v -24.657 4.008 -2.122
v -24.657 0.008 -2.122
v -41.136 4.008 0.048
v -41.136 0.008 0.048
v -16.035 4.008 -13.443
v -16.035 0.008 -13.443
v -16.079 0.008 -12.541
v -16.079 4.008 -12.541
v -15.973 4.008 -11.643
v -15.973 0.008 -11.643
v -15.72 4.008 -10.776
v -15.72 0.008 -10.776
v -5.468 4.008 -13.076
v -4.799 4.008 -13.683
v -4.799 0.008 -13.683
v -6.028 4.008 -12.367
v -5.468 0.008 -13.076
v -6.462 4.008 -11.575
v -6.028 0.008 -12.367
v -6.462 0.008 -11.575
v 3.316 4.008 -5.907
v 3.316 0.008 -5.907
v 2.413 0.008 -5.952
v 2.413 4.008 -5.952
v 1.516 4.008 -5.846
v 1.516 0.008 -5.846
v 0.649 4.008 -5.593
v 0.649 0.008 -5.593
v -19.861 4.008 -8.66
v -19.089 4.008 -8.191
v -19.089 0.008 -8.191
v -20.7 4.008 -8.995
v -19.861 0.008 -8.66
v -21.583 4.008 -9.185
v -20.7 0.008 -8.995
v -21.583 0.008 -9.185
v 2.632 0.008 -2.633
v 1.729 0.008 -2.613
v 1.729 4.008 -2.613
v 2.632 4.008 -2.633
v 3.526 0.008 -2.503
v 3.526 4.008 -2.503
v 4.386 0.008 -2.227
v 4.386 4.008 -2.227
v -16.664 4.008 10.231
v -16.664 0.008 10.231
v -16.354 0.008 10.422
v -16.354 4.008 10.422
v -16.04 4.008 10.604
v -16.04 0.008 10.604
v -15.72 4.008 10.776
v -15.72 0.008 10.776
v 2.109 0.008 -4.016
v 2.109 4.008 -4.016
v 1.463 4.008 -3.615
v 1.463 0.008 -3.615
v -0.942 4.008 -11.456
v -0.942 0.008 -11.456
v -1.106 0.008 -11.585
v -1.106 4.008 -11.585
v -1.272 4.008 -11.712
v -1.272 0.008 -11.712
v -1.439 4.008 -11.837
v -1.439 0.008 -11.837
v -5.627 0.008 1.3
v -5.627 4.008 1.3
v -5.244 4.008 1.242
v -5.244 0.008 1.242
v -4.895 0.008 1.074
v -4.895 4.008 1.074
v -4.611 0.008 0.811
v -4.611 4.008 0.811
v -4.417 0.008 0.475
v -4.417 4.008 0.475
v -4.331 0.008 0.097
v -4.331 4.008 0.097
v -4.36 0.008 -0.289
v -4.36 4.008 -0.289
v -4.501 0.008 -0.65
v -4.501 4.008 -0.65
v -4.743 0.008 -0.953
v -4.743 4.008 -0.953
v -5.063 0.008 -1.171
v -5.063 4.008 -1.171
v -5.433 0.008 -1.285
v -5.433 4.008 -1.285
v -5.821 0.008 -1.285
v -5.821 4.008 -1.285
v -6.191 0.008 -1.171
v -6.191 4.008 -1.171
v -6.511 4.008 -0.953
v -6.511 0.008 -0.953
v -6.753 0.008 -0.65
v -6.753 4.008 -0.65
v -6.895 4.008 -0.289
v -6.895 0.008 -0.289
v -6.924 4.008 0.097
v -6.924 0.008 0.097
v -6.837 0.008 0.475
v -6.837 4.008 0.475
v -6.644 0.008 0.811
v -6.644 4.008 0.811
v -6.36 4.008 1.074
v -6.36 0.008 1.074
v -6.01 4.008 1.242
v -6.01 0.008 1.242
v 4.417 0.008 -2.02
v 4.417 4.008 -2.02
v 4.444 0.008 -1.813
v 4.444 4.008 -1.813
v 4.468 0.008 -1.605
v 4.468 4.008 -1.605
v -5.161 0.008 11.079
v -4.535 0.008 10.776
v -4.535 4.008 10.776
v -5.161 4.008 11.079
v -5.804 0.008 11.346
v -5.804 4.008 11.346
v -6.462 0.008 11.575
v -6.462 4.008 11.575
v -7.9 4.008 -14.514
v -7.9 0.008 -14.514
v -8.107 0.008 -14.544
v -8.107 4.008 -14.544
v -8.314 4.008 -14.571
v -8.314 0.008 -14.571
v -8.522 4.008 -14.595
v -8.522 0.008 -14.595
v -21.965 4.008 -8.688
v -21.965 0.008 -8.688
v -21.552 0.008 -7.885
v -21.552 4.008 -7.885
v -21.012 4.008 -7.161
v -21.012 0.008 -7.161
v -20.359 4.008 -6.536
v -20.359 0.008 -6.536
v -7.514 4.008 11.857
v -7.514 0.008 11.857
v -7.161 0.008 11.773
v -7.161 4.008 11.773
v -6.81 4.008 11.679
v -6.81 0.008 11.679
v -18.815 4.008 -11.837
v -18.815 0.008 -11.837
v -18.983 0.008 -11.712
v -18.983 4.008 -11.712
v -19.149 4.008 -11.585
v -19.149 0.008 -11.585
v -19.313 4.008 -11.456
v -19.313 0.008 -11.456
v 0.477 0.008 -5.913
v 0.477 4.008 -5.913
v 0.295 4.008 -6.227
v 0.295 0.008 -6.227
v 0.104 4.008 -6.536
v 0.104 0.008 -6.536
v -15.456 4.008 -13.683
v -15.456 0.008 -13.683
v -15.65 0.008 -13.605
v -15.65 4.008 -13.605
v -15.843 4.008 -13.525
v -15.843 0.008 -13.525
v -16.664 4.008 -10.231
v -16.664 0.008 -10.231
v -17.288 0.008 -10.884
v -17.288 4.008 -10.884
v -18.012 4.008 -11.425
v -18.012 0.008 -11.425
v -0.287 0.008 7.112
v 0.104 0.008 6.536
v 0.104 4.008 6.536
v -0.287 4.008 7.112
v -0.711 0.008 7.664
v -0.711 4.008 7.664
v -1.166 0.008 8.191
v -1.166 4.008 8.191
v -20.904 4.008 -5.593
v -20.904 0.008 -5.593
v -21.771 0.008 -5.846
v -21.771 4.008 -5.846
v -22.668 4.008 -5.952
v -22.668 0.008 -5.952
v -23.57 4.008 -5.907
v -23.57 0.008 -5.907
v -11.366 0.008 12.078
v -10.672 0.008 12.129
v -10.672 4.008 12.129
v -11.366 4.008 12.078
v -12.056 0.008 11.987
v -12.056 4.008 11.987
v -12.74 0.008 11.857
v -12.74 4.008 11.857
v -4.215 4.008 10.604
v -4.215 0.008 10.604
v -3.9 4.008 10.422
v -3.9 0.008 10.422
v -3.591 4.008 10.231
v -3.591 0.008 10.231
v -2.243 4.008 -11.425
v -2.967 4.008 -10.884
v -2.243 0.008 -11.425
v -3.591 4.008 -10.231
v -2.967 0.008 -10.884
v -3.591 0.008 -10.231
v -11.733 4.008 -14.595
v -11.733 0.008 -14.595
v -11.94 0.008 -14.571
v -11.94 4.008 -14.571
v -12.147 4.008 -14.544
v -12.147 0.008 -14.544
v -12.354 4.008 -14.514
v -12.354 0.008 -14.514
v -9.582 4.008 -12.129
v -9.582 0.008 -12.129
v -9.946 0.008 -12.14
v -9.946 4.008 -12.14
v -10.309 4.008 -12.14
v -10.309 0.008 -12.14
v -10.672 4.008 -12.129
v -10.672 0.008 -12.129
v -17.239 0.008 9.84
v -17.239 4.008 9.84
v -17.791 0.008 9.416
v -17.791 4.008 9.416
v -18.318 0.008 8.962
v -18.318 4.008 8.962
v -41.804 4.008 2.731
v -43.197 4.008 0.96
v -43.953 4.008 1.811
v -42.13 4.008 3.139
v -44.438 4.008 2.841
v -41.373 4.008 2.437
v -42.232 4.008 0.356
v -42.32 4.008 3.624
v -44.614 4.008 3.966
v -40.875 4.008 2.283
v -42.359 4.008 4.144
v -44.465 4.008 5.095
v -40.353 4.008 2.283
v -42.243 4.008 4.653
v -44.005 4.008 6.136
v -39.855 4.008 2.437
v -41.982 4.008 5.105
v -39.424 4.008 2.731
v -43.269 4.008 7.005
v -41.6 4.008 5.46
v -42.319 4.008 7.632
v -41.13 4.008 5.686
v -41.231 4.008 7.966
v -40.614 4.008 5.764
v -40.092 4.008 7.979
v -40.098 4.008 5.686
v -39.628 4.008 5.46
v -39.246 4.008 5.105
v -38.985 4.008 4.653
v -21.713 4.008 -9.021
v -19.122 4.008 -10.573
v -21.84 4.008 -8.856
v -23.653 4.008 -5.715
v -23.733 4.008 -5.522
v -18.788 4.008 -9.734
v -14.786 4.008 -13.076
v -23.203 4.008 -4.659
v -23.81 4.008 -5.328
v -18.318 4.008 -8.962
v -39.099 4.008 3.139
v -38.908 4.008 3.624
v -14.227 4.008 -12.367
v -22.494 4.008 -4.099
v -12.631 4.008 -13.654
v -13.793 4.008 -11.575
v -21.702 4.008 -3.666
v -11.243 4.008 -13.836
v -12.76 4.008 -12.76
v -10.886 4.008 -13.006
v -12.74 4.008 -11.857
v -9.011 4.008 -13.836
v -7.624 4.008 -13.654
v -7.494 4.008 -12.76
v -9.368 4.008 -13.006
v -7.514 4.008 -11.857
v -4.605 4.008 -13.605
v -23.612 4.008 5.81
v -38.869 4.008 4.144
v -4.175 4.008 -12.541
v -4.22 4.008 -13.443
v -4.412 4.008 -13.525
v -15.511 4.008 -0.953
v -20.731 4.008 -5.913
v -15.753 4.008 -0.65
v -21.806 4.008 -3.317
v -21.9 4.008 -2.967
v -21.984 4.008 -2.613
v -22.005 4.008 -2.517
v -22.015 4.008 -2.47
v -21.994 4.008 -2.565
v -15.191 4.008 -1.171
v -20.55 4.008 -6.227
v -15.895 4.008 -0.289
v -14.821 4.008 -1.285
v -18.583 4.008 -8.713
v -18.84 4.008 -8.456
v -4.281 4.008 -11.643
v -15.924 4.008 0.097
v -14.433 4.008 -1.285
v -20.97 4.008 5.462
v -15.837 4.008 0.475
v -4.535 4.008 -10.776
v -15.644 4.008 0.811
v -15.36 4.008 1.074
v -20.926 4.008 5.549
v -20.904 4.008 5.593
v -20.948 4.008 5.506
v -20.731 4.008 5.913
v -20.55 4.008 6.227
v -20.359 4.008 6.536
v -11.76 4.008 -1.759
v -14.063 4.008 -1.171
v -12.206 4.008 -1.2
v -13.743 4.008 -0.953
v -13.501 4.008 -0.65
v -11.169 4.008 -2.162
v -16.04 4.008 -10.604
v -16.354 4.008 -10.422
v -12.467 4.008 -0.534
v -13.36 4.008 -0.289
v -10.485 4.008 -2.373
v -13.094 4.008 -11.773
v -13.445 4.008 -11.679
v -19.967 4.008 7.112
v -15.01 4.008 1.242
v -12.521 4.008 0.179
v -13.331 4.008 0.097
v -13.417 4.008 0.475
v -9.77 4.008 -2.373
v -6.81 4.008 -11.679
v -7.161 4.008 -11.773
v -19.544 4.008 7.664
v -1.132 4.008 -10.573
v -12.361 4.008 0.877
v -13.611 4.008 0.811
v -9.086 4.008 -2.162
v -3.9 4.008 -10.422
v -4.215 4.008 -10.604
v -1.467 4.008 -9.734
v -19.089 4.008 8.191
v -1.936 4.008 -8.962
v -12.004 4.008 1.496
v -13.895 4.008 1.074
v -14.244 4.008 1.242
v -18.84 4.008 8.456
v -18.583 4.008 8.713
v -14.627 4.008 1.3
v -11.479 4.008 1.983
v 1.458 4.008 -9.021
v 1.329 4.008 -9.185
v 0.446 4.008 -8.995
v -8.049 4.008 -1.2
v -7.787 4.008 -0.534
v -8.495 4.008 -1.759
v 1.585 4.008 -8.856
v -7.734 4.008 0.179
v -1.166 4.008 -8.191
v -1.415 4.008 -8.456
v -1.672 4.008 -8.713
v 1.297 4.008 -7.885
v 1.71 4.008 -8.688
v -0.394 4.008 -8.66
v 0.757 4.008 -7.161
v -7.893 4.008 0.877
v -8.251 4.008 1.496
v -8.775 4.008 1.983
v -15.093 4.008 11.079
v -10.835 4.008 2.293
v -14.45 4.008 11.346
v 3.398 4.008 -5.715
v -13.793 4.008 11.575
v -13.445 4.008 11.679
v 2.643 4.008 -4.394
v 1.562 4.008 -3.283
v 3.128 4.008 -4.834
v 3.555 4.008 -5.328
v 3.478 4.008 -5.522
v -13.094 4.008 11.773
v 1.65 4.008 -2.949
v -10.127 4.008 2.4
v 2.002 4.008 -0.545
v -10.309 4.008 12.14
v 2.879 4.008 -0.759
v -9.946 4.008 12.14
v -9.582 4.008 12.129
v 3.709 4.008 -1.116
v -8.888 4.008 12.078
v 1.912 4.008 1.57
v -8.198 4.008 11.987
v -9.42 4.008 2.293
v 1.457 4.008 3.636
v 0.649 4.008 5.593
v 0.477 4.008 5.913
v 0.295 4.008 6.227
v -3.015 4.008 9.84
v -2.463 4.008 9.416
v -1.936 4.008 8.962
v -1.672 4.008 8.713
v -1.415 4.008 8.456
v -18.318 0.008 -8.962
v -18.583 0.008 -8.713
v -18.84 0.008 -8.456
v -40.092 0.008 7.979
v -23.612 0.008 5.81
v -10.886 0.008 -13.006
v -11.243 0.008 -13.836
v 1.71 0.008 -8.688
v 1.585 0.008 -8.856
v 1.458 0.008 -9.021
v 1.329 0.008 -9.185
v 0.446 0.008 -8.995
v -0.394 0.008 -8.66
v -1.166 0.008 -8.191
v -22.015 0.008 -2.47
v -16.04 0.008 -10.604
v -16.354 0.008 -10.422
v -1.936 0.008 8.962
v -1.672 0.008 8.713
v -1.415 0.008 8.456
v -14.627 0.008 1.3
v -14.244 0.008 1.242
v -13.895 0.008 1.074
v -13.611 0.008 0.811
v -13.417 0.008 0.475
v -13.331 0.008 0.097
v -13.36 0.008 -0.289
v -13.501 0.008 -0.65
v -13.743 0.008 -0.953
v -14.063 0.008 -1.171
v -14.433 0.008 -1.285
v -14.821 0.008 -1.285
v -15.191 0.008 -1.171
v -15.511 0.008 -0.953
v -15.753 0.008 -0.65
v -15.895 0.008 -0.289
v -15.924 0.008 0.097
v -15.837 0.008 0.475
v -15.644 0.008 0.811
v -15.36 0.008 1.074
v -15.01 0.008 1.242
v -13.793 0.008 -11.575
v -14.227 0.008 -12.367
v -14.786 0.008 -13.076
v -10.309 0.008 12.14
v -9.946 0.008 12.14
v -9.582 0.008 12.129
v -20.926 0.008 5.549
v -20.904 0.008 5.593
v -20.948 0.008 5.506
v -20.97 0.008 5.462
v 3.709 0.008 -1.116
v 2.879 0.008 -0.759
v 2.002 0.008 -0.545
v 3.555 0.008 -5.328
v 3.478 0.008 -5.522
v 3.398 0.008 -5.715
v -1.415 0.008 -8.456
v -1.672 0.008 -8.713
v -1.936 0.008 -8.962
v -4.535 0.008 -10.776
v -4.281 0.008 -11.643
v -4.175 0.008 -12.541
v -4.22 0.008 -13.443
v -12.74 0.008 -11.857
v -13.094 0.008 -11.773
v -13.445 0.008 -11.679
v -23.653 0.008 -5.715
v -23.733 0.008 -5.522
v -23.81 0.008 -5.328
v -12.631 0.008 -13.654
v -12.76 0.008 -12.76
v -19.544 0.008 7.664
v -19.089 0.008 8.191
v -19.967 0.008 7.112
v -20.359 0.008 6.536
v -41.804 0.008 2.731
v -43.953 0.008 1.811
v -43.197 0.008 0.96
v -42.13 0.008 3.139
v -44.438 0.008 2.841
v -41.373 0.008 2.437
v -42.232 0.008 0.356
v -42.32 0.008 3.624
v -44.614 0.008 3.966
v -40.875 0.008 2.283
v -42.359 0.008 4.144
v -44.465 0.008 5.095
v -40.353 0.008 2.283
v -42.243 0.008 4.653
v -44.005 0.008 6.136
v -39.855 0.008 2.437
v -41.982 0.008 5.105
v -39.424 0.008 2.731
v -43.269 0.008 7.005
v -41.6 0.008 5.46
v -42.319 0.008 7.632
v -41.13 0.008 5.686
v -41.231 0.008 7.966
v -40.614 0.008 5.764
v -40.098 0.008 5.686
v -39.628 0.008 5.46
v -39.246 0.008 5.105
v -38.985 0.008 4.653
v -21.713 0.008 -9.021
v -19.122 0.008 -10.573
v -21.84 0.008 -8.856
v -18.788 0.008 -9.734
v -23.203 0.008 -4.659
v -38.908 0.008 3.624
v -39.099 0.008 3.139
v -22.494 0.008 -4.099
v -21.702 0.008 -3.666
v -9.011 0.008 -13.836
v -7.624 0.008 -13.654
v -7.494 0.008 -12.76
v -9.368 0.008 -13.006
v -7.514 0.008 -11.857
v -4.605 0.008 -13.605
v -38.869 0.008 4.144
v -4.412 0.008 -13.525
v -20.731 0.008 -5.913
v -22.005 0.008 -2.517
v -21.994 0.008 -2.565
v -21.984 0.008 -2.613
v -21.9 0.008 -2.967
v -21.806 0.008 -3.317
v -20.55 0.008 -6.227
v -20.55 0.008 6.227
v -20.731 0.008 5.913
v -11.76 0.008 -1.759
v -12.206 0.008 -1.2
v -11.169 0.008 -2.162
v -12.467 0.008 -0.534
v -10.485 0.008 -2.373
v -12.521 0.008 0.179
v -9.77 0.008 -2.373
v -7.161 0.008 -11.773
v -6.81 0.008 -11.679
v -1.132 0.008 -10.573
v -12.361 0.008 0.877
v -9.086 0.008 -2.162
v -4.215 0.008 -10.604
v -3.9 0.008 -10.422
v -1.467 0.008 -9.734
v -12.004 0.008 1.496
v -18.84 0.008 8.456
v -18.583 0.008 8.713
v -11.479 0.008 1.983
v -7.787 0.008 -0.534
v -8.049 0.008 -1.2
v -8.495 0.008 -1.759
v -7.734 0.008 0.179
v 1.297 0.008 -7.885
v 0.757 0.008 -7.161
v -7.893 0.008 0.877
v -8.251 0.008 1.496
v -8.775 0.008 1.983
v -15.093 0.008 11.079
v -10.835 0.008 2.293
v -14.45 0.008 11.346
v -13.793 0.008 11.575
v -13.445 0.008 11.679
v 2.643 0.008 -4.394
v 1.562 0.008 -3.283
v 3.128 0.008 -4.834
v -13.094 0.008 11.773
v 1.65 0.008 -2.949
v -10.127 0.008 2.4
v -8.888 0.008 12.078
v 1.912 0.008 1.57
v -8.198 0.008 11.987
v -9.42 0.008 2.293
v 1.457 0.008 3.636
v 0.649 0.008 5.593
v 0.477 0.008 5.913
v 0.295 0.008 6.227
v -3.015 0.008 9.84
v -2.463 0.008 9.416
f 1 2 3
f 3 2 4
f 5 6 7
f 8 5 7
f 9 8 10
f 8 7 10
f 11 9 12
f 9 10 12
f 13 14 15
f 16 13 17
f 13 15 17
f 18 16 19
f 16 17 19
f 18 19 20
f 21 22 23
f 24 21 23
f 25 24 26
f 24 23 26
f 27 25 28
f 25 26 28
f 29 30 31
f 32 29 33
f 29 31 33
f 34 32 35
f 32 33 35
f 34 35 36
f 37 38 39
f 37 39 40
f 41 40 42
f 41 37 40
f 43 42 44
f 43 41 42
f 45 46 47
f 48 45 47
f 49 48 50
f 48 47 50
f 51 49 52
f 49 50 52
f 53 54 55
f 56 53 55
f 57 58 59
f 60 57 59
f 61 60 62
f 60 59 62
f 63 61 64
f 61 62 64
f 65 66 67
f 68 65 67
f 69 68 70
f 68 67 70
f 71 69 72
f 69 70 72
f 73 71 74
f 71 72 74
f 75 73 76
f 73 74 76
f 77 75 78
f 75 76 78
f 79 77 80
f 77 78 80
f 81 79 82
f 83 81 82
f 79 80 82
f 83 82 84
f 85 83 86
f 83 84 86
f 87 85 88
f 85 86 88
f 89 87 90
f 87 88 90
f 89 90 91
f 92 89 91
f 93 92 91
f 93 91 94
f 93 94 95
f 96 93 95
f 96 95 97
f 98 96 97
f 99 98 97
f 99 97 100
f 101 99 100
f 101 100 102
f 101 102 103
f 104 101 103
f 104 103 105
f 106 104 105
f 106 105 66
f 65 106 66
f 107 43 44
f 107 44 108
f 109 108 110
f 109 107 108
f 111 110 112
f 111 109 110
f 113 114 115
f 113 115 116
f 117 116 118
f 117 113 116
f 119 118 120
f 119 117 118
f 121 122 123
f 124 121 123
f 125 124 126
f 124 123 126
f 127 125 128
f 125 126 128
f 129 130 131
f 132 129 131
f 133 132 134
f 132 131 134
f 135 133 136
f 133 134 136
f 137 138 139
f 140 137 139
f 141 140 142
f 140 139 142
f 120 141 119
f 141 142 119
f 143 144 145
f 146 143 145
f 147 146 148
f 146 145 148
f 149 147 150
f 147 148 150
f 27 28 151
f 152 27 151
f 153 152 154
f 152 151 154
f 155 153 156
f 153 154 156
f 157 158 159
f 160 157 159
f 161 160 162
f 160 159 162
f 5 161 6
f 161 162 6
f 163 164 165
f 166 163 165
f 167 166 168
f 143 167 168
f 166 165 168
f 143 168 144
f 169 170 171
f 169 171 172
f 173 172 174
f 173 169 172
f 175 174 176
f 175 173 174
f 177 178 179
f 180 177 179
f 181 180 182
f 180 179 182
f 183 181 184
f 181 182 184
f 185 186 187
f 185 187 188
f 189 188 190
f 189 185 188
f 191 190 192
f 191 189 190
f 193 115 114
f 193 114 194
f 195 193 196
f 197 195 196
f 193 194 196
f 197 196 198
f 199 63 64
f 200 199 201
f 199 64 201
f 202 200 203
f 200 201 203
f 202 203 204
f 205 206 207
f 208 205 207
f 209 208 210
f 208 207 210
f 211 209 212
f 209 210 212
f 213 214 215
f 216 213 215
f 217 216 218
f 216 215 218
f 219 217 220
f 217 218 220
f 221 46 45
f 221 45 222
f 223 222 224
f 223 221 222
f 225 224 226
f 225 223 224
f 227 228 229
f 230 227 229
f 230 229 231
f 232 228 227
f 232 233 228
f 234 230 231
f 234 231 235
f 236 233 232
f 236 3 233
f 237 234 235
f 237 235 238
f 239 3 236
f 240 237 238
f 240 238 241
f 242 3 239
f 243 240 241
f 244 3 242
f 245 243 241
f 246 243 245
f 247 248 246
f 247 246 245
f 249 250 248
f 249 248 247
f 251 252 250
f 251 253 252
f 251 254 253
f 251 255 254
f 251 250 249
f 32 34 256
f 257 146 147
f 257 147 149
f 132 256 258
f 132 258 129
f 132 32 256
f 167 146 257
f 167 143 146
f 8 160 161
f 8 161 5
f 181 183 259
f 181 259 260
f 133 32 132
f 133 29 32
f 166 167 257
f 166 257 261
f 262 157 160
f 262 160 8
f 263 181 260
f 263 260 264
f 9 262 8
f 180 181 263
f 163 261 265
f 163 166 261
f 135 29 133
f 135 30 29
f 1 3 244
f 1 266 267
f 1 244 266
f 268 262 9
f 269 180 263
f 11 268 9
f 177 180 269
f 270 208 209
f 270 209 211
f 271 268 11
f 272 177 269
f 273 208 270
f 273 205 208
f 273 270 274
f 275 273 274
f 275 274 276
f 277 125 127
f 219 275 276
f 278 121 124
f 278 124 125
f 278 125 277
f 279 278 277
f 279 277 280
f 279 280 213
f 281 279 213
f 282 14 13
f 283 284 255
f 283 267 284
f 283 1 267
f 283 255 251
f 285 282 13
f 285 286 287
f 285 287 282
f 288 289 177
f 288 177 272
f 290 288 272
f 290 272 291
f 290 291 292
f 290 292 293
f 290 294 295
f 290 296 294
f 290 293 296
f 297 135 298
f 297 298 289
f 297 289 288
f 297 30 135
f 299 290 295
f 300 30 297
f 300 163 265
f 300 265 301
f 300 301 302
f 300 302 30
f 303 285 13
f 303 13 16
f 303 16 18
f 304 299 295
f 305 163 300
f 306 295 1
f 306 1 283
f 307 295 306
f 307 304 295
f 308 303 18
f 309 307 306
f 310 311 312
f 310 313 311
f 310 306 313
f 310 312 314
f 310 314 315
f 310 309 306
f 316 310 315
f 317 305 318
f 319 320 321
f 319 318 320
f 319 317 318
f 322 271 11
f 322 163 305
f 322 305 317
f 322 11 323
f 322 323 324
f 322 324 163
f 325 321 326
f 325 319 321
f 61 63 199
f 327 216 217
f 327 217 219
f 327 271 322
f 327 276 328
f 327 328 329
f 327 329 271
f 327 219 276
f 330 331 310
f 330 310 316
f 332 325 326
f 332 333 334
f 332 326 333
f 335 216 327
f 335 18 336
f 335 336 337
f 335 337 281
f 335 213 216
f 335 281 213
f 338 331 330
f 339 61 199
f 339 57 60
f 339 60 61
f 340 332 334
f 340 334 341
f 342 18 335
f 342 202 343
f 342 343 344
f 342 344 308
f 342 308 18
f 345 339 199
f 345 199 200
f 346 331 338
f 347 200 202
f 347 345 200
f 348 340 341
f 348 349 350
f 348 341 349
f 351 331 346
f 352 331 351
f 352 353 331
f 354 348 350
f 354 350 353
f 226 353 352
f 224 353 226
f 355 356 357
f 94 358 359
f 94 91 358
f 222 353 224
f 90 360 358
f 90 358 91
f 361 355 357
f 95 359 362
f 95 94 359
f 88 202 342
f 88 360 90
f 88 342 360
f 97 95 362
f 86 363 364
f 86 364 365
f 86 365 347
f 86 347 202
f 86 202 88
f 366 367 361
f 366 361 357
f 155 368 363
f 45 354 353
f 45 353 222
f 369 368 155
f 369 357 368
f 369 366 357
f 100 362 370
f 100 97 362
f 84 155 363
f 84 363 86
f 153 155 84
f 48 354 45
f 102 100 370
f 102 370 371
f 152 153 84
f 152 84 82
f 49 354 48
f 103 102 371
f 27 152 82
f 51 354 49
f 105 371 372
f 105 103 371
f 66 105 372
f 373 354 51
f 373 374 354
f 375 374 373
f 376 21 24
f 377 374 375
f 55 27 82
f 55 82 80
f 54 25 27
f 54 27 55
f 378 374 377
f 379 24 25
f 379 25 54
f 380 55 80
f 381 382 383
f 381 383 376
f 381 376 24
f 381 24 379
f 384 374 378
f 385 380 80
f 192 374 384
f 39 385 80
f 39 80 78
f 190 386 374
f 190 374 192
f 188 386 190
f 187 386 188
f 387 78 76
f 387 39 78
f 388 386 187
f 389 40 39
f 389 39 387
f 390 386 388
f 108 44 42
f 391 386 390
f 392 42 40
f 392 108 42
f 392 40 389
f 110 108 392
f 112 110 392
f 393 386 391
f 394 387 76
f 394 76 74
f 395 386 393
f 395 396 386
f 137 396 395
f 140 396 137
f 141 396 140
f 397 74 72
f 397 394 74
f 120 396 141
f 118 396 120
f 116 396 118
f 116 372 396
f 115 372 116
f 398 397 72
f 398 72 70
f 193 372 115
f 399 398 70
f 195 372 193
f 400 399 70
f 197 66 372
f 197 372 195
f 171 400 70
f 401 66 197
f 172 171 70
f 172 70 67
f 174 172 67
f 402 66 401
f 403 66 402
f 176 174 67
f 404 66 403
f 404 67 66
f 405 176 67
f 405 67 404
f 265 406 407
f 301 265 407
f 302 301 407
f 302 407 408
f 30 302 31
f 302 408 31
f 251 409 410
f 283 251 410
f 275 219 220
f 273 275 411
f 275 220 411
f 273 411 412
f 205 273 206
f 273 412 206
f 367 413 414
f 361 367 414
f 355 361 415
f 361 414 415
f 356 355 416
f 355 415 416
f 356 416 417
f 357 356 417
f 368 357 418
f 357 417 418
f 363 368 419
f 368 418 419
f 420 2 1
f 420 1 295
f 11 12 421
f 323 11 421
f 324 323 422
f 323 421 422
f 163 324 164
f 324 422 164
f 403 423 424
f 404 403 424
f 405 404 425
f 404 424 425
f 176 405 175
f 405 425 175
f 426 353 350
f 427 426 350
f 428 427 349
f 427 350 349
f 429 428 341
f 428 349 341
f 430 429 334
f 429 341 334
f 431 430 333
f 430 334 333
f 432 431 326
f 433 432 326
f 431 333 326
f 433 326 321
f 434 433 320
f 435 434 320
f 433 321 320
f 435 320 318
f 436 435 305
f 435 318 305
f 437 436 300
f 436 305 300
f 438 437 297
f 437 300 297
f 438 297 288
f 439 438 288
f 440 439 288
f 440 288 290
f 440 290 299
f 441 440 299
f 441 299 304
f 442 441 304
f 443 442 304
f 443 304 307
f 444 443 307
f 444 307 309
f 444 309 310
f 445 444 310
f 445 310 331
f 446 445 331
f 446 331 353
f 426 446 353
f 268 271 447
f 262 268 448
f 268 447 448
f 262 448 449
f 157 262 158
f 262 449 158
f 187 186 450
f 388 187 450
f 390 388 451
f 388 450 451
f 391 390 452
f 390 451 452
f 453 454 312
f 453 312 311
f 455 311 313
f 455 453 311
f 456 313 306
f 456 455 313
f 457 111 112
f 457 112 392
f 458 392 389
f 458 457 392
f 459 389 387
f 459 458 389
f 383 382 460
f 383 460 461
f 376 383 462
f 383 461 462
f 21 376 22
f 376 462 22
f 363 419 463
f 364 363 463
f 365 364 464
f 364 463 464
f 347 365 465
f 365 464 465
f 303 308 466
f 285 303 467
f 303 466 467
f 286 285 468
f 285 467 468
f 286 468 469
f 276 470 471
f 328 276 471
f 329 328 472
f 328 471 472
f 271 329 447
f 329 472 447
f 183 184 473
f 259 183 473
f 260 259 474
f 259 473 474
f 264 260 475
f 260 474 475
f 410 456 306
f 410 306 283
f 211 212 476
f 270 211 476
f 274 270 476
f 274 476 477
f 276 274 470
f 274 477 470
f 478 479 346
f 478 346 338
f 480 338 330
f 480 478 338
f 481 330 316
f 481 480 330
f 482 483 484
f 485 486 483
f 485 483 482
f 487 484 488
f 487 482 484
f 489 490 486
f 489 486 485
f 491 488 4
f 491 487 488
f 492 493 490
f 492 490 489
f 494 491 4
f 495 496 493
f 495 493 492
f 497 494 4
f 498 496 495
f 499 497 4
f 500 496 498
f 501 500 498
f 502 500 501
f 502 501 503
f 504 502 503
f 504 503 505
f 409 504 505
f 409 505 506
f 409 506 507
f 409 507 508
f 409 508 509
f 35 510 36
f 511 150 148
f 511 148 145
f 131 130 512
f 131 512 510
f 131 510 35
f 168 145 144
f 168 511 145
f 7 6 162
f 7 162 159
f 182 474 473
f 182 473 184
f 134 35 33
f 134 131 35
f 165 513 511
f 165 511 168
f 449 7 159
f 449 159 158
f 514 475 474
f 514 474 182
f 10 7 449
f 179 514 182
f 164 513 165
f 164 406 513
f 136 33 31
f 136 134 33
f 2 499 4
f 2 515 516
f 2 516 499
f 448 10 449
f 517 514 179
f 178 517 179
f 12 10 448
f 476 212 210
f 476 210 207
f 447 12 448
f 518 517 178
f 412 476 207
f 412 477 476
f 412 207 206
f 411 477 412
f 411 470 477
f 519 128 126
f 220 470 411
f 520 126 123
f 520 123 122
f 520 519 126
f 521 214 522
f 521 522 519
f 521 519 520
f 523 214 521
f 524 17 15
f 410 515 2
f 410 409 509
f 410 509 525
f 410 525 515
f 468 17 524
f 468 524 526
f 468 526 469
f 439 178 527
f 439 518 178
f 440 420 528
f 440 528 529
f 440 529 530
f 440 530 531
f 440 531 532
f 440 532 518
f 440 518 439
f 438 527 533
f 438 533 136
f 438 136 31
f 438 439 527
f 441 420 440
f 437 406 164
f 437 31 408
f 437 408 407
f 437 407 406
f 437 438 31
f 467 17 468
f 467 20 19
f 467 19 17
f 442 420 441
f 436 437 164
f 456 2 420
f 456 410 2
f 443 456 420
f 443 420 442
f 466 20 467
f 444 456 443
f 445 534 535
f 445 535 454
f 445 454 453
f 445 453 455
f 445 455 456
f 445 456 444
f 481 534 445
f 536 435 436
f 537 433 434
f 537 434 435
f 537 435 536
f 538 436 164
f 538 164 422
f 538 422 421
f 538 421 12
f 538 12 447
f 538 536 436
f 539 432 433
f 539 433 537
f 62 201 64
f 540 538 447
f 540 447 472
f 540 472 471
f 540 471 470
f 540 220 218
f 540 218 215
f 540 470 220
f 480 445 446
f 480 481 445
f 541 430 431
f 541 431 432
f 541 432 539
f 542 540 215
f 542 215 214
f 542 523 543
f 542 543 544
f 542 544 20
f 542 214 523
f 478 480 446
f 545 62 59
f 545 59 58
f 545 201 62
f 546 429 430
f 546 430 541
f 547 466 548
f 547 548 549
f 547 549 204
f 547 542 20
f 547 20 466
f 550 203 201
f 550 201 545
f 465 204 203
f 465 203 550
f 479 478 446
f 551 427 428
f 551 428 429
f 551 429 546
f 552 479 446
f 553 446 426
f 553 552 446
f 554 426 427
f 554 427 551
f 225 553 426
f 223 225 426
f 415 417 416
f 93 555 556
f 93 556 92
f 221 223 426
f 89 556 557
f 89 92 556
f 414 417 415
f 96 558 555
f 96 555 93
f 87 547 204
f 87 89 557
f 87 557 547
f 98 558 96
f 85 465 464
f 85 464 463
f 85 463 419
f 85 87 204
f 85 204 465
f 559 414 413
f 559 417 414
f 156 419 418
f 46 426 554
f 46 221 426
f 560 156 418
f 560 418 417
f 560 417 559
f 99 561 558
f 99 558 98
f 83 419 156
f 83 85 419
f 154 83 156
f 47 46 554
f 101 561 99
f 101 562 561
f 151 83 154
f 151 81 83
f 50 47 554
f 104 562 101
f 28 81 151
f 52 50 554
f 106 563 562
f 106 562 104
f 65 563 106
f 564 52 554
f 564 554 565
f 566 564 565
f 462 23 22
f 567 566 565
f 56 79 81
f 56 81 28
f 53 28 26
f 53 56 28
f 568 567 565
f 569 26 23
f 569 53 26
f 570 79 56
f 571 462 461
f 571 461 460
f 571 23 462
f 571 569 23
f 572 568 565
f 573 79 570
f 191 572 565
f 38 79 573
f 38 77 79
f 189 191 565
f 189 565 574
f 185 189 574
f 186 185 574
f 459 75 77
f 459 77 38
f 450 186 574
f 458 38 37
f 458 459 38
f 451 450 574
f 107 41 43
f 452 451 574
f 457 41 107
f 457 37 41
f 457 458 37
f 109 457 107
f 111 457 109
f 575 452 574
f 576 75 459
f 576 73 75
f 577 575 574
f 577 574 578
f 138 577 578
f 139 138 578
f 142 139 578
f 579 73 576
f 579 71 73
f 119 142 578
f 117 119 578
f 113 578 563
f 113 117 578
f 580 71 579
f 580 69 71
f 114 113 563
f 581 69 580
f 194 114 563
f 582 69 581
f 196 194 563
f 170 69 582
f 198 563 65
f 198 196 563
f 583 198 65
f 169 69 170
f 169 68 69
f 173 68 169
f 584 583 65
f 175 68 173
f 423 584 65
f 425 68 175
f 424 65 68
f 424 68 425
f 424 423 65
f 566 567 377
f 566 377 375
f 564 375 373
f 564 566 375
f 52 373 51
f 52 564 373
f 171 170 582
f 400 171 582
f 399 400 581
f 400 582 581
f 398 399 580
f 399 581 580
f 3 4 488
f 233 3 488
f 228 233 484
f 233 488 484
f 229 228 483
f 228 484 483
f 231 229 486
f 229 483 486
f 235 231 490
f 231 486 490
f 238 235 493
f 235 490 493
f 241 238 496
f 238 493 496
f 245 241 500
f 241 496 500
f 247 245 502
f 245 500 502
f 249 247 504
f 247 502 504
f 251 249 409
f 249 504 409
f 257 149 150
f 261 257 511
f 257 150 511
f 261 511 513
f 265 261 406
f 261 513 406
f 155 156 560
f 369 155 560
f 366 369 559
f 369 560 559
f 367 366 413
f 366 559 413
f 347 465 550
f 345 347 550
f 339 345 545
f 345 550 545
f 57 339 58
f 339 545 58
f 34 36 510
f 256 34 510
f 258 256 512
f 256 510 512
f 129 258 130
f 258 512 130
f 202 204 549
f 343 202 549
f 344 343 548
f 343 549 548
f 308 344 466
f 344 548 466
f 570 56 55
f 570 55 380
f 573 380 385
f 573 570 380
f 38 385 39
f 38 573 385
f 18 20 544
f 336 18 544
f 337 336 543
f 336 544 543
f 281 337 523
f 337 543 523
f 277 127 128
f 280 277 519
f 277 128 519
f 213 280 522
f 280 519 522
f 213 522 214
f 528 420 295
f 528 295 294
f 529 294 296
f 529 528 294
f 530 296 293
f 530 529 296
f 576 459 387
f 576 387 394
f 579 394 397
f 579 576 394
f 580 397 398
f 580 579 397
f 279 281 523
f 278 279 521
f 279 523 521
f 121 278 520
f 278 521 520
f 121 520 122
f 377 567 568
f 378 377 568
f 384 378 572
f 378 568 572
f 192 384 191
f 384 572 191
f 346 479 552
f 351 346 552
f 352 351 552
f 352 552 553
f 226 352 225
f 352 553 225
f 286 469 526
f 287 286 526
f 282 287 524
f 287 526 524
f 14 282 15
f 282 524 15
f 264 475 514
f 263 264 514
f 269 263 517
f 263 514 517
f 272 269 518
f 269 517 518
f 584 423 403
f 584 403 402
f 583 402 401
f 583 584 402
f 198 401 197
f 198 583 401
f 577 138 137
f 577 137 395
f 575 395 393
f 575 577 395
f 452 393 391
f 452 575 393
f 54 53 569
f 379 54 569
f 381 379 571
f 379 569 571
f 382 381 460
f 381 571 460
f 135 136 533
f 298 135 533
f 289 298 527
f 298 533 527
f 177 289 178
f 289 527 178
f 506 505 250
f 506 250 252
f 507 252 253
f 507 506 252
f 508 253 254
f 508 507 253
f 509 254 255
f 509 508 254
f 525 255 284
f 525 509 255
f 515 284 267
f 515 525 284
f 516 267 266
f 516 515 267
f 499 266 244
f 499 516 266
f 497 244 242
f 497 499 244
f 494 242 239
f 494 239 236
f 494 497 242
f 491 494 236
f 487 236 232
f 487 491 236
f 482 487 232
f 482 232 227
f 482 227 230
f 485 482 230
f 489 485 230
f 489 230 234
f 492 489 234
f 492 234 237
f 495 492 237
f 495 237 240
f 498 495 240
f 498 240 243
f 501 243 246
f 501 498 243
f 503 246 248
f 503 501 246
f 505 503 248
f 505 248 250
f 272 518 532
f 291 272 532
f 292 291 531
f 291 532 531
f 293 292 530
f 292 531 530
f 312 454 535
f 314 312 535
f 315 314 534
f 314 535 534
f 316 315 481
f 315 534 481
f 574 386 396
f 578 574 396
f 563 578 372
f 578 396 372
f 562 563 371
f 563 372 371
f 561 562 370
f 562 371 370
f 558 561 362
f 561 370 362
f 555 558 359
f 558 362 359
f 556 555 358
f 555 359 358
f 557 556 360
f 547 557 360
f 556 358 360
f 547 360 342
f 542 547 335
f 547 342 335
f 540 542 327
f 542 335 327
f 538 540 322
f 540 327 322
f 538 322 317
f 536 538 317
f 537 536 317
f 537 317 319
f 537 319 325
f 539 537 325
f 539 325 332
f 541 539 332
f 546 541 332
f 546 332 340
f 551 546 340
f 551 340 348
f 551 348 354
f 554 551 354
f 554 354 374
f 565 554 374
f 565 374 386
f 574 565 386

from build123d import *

# Parameters (mm, degrees)
SKETCH1_R           = 1.5
BOSS_EXTRUDE1_DEPTH = 4
SCALE1_SCALE        = 1.004
BOSS_EXTRUDE2_START = -4
SKETCH3_R           = 1.506
SKETCH3_R_2         = 1.5
SKETCH3_R_3         = 1.75
BOSS_EXTRUDE2_DEPTH = 4
CUT_EXTRUDE1_START  = -4.016
CUT_EXTRUDE1_DEPTH  = 4.016
CUT_EXTRUDE2_REACH  = 49.112
SKETCH5_R           = 1.3
SKETCH5_R_2         = 2.4
SKETCH6_W           = 34.675859163
SKETCH6_H           = 30.444089621
CUT_EXTRUDE3_DEPTH  = 0.016


with BuildPart() as part:
    # Sketch1 → Boss-Extrude1 (new body)
    with BuildSketch(Plane(origin=(0, 0, 0), x_dir=(1, 0, 0), z_dir=(0, 1, 0))):
        with BuildLine():
            Line((20.643657446, 4), (2.081641936, 4))
            ThreePointArc((2.081641936, 4), (2.861028333, 4.588201733), (3.521749436, 5.30713988))
            ThreePointArc((3.521749436, 5.30713988), (3.405395609, 5.596745198), (3.282888305, 5.883801663))
            ThreePointArc((3.282888305, 5.883801663), (1.93527598, 5.894040025), (0.627094961, 5.57027124))
            ThreePointArc((0.627094961, 5.57027124), (0.366286148, 6.046375), (0.084372603, 6.510293938))
            ThreePointArc((0.084372603, 6.510293938), (1.018855105, 7.48132754), (1.683794586, 8.65351323))
            ThreePointArc((1.683794586, 8.65351323), (1.496450048, 8.903135899), (1.303821399, 9.148703928))
            ThreePointArc((1.303821399, 9.148703928), (-0.000522033, 8.809805691), (-1.180330337, 8.158486898))
            ThreePointArc((-1.180330337, 8.158486898), (-1.555477026, 8.550865528), (-1.947855656, 8.926012217))
            ThreePointArc((-1.947855656, 8.926012217), (-1.296536862, 10.105820521), (-0.957638625, 11.410163953))
            ThreePointArc((-0.957638625, 11.410163953), (-1.203206655, 11.602792602), (-1.452829324, 11.79013714))
            ThreePointArc((-1.452829324, 11.79013714), (-2.625015014, 11.125197659), (-3.596048616, 10.190715157))
            ThreePointArc((-3.596048616, 10.190715157), (-4.059967554, 10.472628702), (-4.536071314, 10.733437515))
            ThreePointArc((-4.536071314, 10.733437515), (-4.212302529, 12.041618533), (-4.222540891, 13.389230859))
            ThreePointArc((-4.222540891, 13.389230859), (-4.509597355, 13.511738163), (-4.799202674, 13.62809199))
            ThreePointArc((-4.799202674, 13.62809199), (-5.759348103, 12.682425791), (-6.455432668, 11.528463019))
            ThreePointArc((-6.455432668, 11.528463019), (-6.976508546, 11.680699536), (-7.503891752, 11.809396783))
            ThreePointArc((-7.503891752, 11.809396783), (-7.529737283, 13.156800143), (-7.888414517, 14.455843809))
            ThreePointArc((-7.888414517, 14.455843809), (-8.197396993, 14.499881098), (-8.507248835, 14.537314892))
            ThreePointArc((-8.507248835, 14.537314892), (-9.18992168, 13.375367565), (-9.563620196, 12.080565177))
            ThreePointArc((-9.563620196, 12.080565177), (-10.106342554, 12.09275), (-10.649064912, 12.080565177))
            ThreePointArc((-10.649064912, 12.080565177), (-11.022763428, 13.375367565), (-11.705436272, 14.537314892))
            ThreePointArc((-11.705436272, 14.537314892), (-12.015288115, 14.499881098), (-12.324270591, 14.455843809))
            ThreePointArc((-12.324270591, 14.455843809), (-12.682947825, 13.156800143), (-12.708793355, 11.809396783))
            ThreePointArc((-12.708793355, 11.809396783), (-13.236176561, 11.680699536), (-13.757252439, 11.528463019))
            ThreePointArc((-13.757252439, 11.528463019), (-14.453337005, 12.682425791), (-15.413482434, 13.62809199))
            ThreePointArc((-15.413482434, 13.62809199), (-15.703087752, 13.511738163), (-15.990144217, 13.389230859))
            ThreePointArc((-15.990144217, 13.389230859), (-16.000382579, 12.041618533), (-15.676613793, 10.733437515))
            ThreePointArc((-15.676613793, 10.733437515), (-16.152717554, 10.472628702), (-16.616636492, 10.190715157))
            ThreePointArc((-16.616636492, 10.190715157), (-17.587670094, 11.125197659), (-18.759855783, 11.79013714))
            ThreePointArc((-18.759855783, 11.79013714), (-19.009478453, 11.602792602), (-19.255046482, 11.410163953))
            ThreePointArc((-19.255046482, 11.410163953), (-18.916148245, 10.105820521), (-18.264829452, 8.926012217))
            ThreePointArc((-18.264829452, 8.926012217), (-18.657208082, 8.550865528), (-19.032354771, 8.158486898))
            ThreePointArc((-19.032354771, 8.158486898), (-20.212163074, 8.809805691), (-21.516506507, 9.148703928))
            ThreePointArc((-21.516506507, 9.148703928), (-21.709135156, 8.903135899), (-21.896479694, 8.65351323))
            ThreePointArc((-21.896479694, 8.65351323), (-21.231540213, 7.48132754), (-20.297057711, 6.510293938))
            ThreePointArc((-20.297057711, 6.510293938), (-20.578971255, 6.046375), (-20.839780068, 5.57027124))
            ThreePointArc((-20.839780068, 5.57027124), (-22.147961087, 5.894040025), (-23.495573413, 5.883801663))
            ThreePointArc((-23.495573413, 5.883801663), (-23.618080717, 5.596745198), (-23.734434544, 5.30713988))
            ThreePointArc((-23.734434544, 5.30713988), (-22.788768345, 4.346994451), (-21.634805572, 3.650909885))
            ThreePointArc((-21.634805572, 3.650909885), (-21.78704209, 3.129834008), (-21.915739337, 2.602450802))
            ThreePointArc((-21.915739337, 2.602450802), (-23.263142697, 2.576605271), (-24.562186363, 2.217928037))
            ThreePointArc((-24.562186363, 2.217928037), (-24.606223651, 1.908945561), (-24.643657446, 1.599093719))
            ThreePointArc((-24.643657446, 1.599093719), (-23.481710119, 0.916420874), (-22.186907731, 0.542722358))
            ThreePointArc((-22.186907731, 0.542722358), (-22.199092554, 0), (-22.186907731, -0.542722358))
            ThreePointArc((-22.186907731, -0.542722358), (-23.481710119, -0.916420874), (-24.643657446, -1.599093719))
            ThreePointArc((-24.643657446, -1.599093719), (-24.606223651, -1.908945561), (-24.562186363, -2.217928037))
            ThreePointArc((-24.562186363, -2.217928037), (-23.263142697, -2.576605271), (-21.915739337, -2.602450802))
            ThreePointArc((-21.915739337, -2.602450802), (-21.78704209, -3.129834008), (-21.634805572, -3.650909885))
            ThreePointArc((-21.634805572, -3.650909885), (-22.788768345, -4.346994451), (-23.734434544, -5.30713988))
            ThreePointArc((-23.734434544, -5.30713988), (-23.618080717, -5.596745198), (-23.495573413, -5.883801663))
            ThreePointArc((-23.495573413, -5.883801663), (-22.147961087, -5.894040025), (-20.839780068, -5.57027124))
            ThreePointArc((-20.839780068, -5.57027124), (-20.578971255, -6.046375), (-20.297057711, -6.510293938))
            ThreePointArc((-20.297057711, -6.510293938), (-21.231540213, -7.48132754), (-21.896479694, -8.65351323))
            ThreePointArc((-21.896479694, -8.65351323), (-21.709135156, -8.903135899), (-21.516506507, -9.148703928))
            ThreePointArc((-21.516506507, -9.148703928), (-20.212163074, -8.809805691), (-19.032354771, -8.158486898))
            ThreePointArc((-19.032354771, -8.158486898), (-18.657208082, -8.550865528), (-18.264829452, -8.926012217))
            ThreePointArc((-18.264829452, -8.926012217), (-18.916148245, -10.105820521), (-19.255046482, -11.410163953))
            ThreePointArc((-19.255046482, -11.410163953), (-19.009478453, -11.602792602), (-18.759855783, -11.79013714))
            ThreePointArc((-18.759855783, -11.79013714), (-17.587670094, -11.125197659), (-16.616636492, -10.190715157))
            ThreePointArc((-16.616636492, -10.190715157), (-16.152717554, -10.472628702), (-15.676613793, -10.733437515))
            ThreePointArc((-15.676613793, -10.733437515), (-16.000382579, -12.041618533), (-15.990144217, -13.389230859))
            ThreePointArc((-15.990144217, -13.389230859), (-15.703087752, -13.511738163), (-15.413482434, -13.62809199))
            ThreePointArc((-15.413482434, -13.62809199), (-14.453337005, -12.682425791), (-13.757252439, -11.528463019))
            ThreePointArc((-13.757252439, -11.528463019), (-13.236176561, -11.680699536), (-12.708793355, -11.809396783))
            ThreePointArc((-12.708793355, -11.809396783), (-12.682947825, -13.156800143), (-12.324270591, -14.455843809))
            ThreePointArc((-12.324270591, -14.455843809), (-12.015288115, -14.499881098), (-11.705436272, -14.537314892))
            ThreePointArc((-11.705436272, -14.537314892), (-11.022763428, -13.375367565), (-10.649064912, -12.080565177))
            ThreePointArc((-10.649064912, -12.080565177), (-10.106342554, -12.09275), (-9.563620196, -12.080565177))
            ThreePointArc((-9.563620196, -12.080565177), (-9.18992168, -13.375367565), (-8.507248835, -14.537314892))
            ThreePointArc((-8.507248835, -14.537314892), (-8.197396993, -14.499881098), (-7.888414517, -14.455843809))
            ThreePointArc((-7.888414517, -14.455843809), (-7.529737283, -13.156800143), (-7.503891752, -11.809396783))
            ThreePointArc((-7.503891752, -11.809396783), (-6.976508546, -11.680699536), (-6.455432668, -11.528463019))
            ThreePointArc((-6.455432668, -11.528463019), (-5.759348103, -12.682425791), (-4.799202674, -13.62809199))
            ThreePointArc((-4.799202674, -13.62809199), (-4.509597355, -13.511738163), (-4.222540891, -13.389230859))
            ThreePointArc((-4.222540891, -13.389230859), (-4.212302529, -12.041618533), (-4.536071314, -10.733437515))
            ThreePointArc((-4.536071314, -10.733437515), (-4.059967554, -10.472628702), (-3.596048616, -10.190715157))
            ThreePointArc((-3.596048616, -10.190715157), (-2.625015014, -11.125197659), (-1.452829324, -11.79013714))
            ThreePointArc((-1.452829324, -11.79013714), (-1.203206655, -11.602792602), (-0.957638625, -11.410163953))
            ThreePointArc((-0.957638625, -11.410163953), (-1.296536862, -10.105820521), (-1.947855656, -8.926012217))
            ThreePointArc((-1.947855656, -8.926012217), (-1.555477026, -8.550865528), (-1.180330337, -8.158486898))
            ThreePointArc((-1.180330337, -8.158486898), (-0.000522033, -8.809805691), (1.303821399, -9.148703928))
            ThreePointArc((1.303821399, -9.148703928), (1.496450048, -8.903135899), (1.683794586, -8.65351323))
            ThreePointArc((1.683794586, -8.65351323), (1.018855105, -7.48132754), (0.084372603, -6.510293938))
            ThreePointArc((0.084372603, -6.510293938), (0.366286148, -6.046375), (0.627094961, -5.57027124))
            ThreePointArc((0.627094961, -5.57027124), (1.93527598, -5.894040025), (3.282888305, -5.883801663))
            ThreePointArc((3.282888305, -5.883801663), (3.405395609, -5.596745198), (3.521749436, -5.30713988))
            ThreePointArc((3.521749436, -5.30713988), (2.861028333, -4.588201733), (2.081641936, -4))
            Line((2.081641936, -4), (20.643657446, -4))
            ThreePointArc((20.643657446, -4), (24.643657446, 0), (20.643657446, 4))
        make_face()
        with Locations(Location((-10.106342554, 0, 0), (0, 0, 270))):
            Circle(SKETCH1_R, mode=Mode.SUBTRACT)
        with Locations(Location((20.643657446, 0, 0), (0, 0, 270))):
            Circle(SKETCH1_R, mode=Mode.SUBTRACT)
    extrude(amount=BOSS_EXTRUDE1_DEPTH)


with BuildPart() as part_1:
    # Scale1: scaled about (-4.879650277, 2, 0)
    add(part.part.scale(SCALE1_SCALE).moved(Location((0.019518601, -0.008, 0))))

    # Sketch3 → Boss-Extrude2 (add)
    # profile 1 of 2: a face of its own
    with BuildSketch(Plane(origin=(0, 4.008, 0), x_dir=(1, 0, 0), z_dir=(0, 1, 0)).offset(BOSS_EXTRUDE2_START)):
        with Locations(Location((-10.127249323, 0, 0), (0, 0, 270))):
            Circle(SKETCH3_R)
        with Locations(Location((-10.127249323, 0, 0), (0, 0, 270))):
            Circle(SKETCH3_R_2, mode=Mode.SUBTRACT)
    # profile 2 of 2: a face of its own
    with BuildSketch(Plane(origin=(0, 4.008, 0), x_dir=(1, 0, 0), z_dir=(0, 1, 0)).offset(BOSS_EXTRUDE2_START)):
        with BuildLine():
            ThreePointArc((-24.640916507, -2.226799749), (-24.685129945, -1.916581343), (-24.722713475, -1.605490094))
            ThreePointArc((-24.722713475, -1.605490094), (-23.556118358, -0.920086558), (-22.256136761, -0.544893247))
            ThreePointArc((-22.256136761, -0.544893247), (-22.268370323, 0), (-22.256136761, 0.544893247))
            ThreePointArc((-22.256136761, 0.544893247), (-23.556118358, 0.920086558), (-24.722713475, 1.605490094))
            ThreePointArc((-24.722713475, 1.605490094), (-24.69197129, 1.863879361), (-24.656655102, 2.121683283))
            Line((-24.656655102, 2.121683283), (-41.136283579, -0.047900965))
            ThreePointArc((-41.136283579, -0.047900965), (-44.579958256, -4.53578518), (-40.092074041, -7.979459856))
            Line((-40.092074041, -7.979459856), (-23.612445564, -5.809875608))
            ThreePointArc((-23.612445564, -5.809875608), (-23.713282947, -5.569996643), (-23.809853681, -5.32836844))
            ThreePointArc((-23.809853681, -5.32836844), (-22.860404818, -4.364382429), (-21.701826194, -3.665513525))
            ThreePointArc((-21.701826194, -3.665513525), (-21.854671657, -3.142353344), (-21.983883693, -2.612860605))
            ThreePointArc((-21.983883693, -2.612860605), (-23.336676666, -2.586911692), (-24.640916507, -2.226799749))
        make_face()
        with Locations(Location((-40.61417881, -4.013680411, 0), (0, 0, 270))):
            Circle(SKETCH3_R_3, mode=Mode.SUBTRACT)
    extrude(amount=BOSS_EXTRUDE2_DEPTH)

    # Sketch4 → Cut-Extrude1 (cut)
    with BuildSketch(Plane(origin=(0, 4.008, 0), x_dir=(1, 0, 0), z_dir=(0, 1, 0)).offset(CUT_EXTRUDE1_START)):
        with BuildLine():
            ThreePointArc((20.745750677, -4.016), (24.761750677, 0), (20.745750677, 4.016))
            Line((20.745750677, 4.016), (2.109487105, 4.016))
            Line((2.109487105, 4.016), (1.463351142, 3.614526248))
            ThreePointArc((1.463351142, 3.614526248), (1.607061005, 3.116533373), (1.729385048, 2.612860605))
            ThreePointArc((1.729385048, 2.612860605), (3.08217802, 2.586911692), (4.386417861, 2.226799749))
            ThreePointArc((4.386417861, 2.226799749), (4.430631299, 1.916581343), (4.468214829, 1.605490094))
            ThreePointArc((4.468214829, 1.605490094), (3.301619712, 0.920086558), (2.001638115, 0.544893247))
            ThreePointArc((2.001638115, 0.544893247), (1.729385048, -2.612860605), (0.649121942, -5.592552325))
            ThreePointArc((0.649121942, -5.592552325), (1.962535685, -5.917616185), (3.315538459, -5.907336869))
            ThreePointArc((3.315538459, -5.907336869), (3.438535793, -5.619132179), (3.555355035, -5.32836844))
            ThreePointArc((3.555355035, -5.32836844), (2.891991048, -4.60655454), (2.109487105, -4.016))
            Line((2.109487105, -4.016), (20.745750677, -4.016))
        make_face()
        with BuildLine():
            ThreePointArc((1.710048366, -8.688127282), (1.042449127, -7.51125285), (0.104228694, -6.536335114))
            ThreePointArc((0.104228694, -6.536335114), (-0.495050423, -7.39104617), (-1.165533057, -8.191120846))
            ThreePointArc((-1.165533057, -8.191120846), (0.01899448, -8.845044914), (1.328555286, -9.185298744))
            ThreePointArc((1.328555286, -9.185298744), (1.521954449, -8.938748443), (1.710048366, -8.688127282))
        make_face()
        with BuildLine():
            ThreePointArc((-0.941950579, -11.455804609), (-1.282204409, -10.146243803), (-1.936128477, -8.961716266))
            ThreePointArc((-1.936128477, -8.961716266), (-2.736203153, -9.6321989), (-3.590914209, -10.231478017))
            ThreePointArc((-3.590914209, -10.231478017), (-2.615996473, -11.16969845), (-1.43912204, -11.837297689))
            ThreePointArc((-1.43912204, -11.837297689), (-1.18850088, -11.649203772), (-0.941950579, -11.455804609))
        make_face()
        with BuildLine():
            ThreePointArc((-4.219912453, -13.442787782), (-4.209633138, -12.089785007), (-4.534696998, -10.776371265))
            ThreePointArc((-4.534696998, -10.776371265), (-5.481043466, -11.216933194), (-6.461735798, -11.574576871))
            ThreePointArc((-6.461735798, -11.574576871), (-5.762866894, -12.733155495), (-4.798880883, -13.682604358))
            ThreePointArc((-4.798880883, -13.682604358), (-4.508117144, -13.565785116), (-4.219912453, -13.442787782))
        make_face()
        with BuildLine():
            ThreePointArc((-7.900449573, -14.513667184), (-7.540337631, -13.209427343), (-7.514388718, -11.856634371))
            ThreePointArc((-7.514388718, -11.856634371), (-8.54251503, -12.037252027), (-9.582356076, -12.128887438))
            ThreePointArc((-9.582356076, -12.128887438), (-9.207162765, -13.428869035), (-8.521759229, -14.595464152))
            ThreePointArc((-8.521759229, -14.595464152), (-8.210667979, -14.557880622), (-7.900449573, -14.513667184))
        make_face()
        with BuildLine():
            ThreePointArc((-11.732739416, -14.595464152), (-11.047335881, -13.428869035), (-10.67214257, -12.128887438))
            ThreePointArc((-10.67214257, -12.128887438), (-11.711983616, -12.037252027), (-12.740109928, -11.856634371))
            ThreePointArc((-12.740109928, -11.856634371), (-12.714161015, -13.209427343), (-12.354049072, -14.513667184))
            ThreePointArc((-12.354049072, -14.513667184), (-12.043830666, -14.557880622), (-11.732739416, -14.595464152))
        make_face()
        with BuildLine():
            ThreePointArc((-15.455617763, -13.682604358), (-14.491631752, -12.733155495), (-13.792762848, -11.574576871))
            ThreePointArc((-13.792762848, -11.574576871), (-14.77345518, -11.216933194), (-15.719801648, -10.776371265))
            ThreePointArc((-15.719801648, -10.776371265), (-16.044865508, -12.089785007), (-16.034586192, -13.442787782))
            ThreePointArc((-16.034586192, -13.442787782), (-15.746381502, -13.565785116), (-15.455617763, -13.682604358))
        make_face()
        with BuildLine():
            ThreePointArc((-18.815376605, -11.837297689), (-17.638502173, -11.16969845), (-16.663584436, -10.231478017))
            ThreePointArc((-16.663584436, -10.231478017), (-17.518295493, -9.6321989), (-18.318370168, -8.961716266))
            ThreePointArc((-18.318370168, -8.961716266), (-18.972294237, -10.146243803), (-19.312548067, -11.455804609))
            ThreePointArc((-19.312548067, -11.455804609), (-19.065997766, -11.649203772), (-18.815376605, -11.837297689))
        make_face()
        with BuildLine():
            ThreePointArc((-21.583053932, -9.185298744), (-20.273493126, -8.845044914), (-19.088965589, -8.191120846))
            ThreePointArc((-19.088965589, -8.191120846), (-19.759448223, -7.39104617), (-20.35872734, -6.536335114))
            ThreePointArc((-20.35872734, -6.536335114), (-21.296947773, -7.51125285), (-21.964547012, -8.688127282))
            ThreePointArc((-21.964547012, -8.688127282), (-21.776453095, -8.938748443), (-21.583053932, -9.185298744))
        make_face()
        with BuildLine():
            ThreePointArc((-22.014565473, 2.469520982), (-21.999440913, 2.541237098), (-21.983883693, 2.612860605))
            ThreePointArc((-21.983883693, 2.612860605), (-23.336676666, 2.586911692), (-24.640916507, 2.226799749))
            ThreePointArc((-24.640916507, 2.226799749), (-24.648880917, 2.174255757), (-24.656655102, 2.121683283))
            Line((-24.656655102, 2.121683283), (-22.014565473, 2.469520982))
        make_face()
        with BuildLine():
            ThreePointArc((-23.570037105, -5.907336869), (-22.21703433, -5.917616185), (-20.903620588, -5.592552325))
            ThreePointArc((-20.903620588, -5.592552325), (-20.937185235, -5.527395835), (-20.970355936, -5.462037909))
            Line((-20.970355936, -5.462037909), (-23.612445564, -5.809875608))
            ThreePointArc((-23.612445564, -5.809875608), (-23.591329521, -5.858644611), (-23.570037105, -5.907336869))
        make_face()
    extrude(amount=CUT_EXTRUDE1_DEPTH, mode=Mode.SUBTRACT)

    # Sketch5 → Cut-Extrude2 (cut, up to next)
    with BuildSketch(Plane(origin=(0, 4.008, 0), x_dir=(1, 0, 0), z_dir=(0, 1, 0)), mode=Mode.PRIVATE) as cut_extrude2_sk1:
        with Locations(Location((-14.627249323, 0, 0), (0, 0, 270))):
            Circle(SKETCH5_R)
    cut_extrude2_tool1 = extrude(cut_extrude2_sk1.sketch, amount=-CUT_EXTRUDE2_REACH, mode=Mode.PRIVATE) & part_1.part
    # Sketch5 → Cut-Extrude2 (cut, up to next)
    with BuildSketch(Plane(origin=(0, 4.008, 0), x_dir=(1, 0, 0), z_dir=(0, 1, 0)), mode=Mode.PRIVATE) as cut_extrude2_sk2:
        with Locations(Location((-5.627249323, 0, 0), (0, 0, 270))):
            Circle(SKETCH5_R)
    cut_extrude2_tool2 = extrude(cut_extrude2_sk2.sketch, amount=-CUT_EXTRUDE2_REACH, mode=Mode.PRIVATE) & part_1.part
    # Sketch5 → Cut-Extrude2 (cut, up to next)
    with BuildSketch(Plane(origin=(0, 4.008, 0), x_dir=(1, 0, 0), z_dir=(0, 1, 0)), mode=Mode.PRIVATE) as cut_extrude2_sk3:
        with Locations(Location((-10.127249323, 0, 0), (0, 0, 270))):
            Circle(SKETCH5_R_2)
    cut_extrude2_tool3 = extrude(cut_extrude2_sk3.sketch, amount=-CUT_EXTRUDE2_REACH, mode=Mode.PRIVATE) & part_1.part
    add(cut_extrude2_tool1.solids().sort_by_distance((-14.627249, 4.008, 0))[0], mode=Mode.SUBTRACT)
    add(cut_extrude2_tool2.solids().sort_by_distance((-5.627249, 4.008, 0))[0], mode=Mode.SUBTRACT)
    add(cut_extrude2_tool3.solids().sort_by_distance((-10.127249, 4.008, 0))[0], mode=Mode.SUBTRACT)

    # Sketch6 → Cut-Extrude3 (cut)
    with BuildSketch(Plane.XZ.offset(0.008)):
        with Locations((-9.760611553, -1.350426999)):
            Rectangle(SKETCH6_W, SKETCH6_H)
    extrude(amount=-CUT_EXTRUDE3_DEPTH, mode=Mode.SUBTRACT)


solid = part_1.part
